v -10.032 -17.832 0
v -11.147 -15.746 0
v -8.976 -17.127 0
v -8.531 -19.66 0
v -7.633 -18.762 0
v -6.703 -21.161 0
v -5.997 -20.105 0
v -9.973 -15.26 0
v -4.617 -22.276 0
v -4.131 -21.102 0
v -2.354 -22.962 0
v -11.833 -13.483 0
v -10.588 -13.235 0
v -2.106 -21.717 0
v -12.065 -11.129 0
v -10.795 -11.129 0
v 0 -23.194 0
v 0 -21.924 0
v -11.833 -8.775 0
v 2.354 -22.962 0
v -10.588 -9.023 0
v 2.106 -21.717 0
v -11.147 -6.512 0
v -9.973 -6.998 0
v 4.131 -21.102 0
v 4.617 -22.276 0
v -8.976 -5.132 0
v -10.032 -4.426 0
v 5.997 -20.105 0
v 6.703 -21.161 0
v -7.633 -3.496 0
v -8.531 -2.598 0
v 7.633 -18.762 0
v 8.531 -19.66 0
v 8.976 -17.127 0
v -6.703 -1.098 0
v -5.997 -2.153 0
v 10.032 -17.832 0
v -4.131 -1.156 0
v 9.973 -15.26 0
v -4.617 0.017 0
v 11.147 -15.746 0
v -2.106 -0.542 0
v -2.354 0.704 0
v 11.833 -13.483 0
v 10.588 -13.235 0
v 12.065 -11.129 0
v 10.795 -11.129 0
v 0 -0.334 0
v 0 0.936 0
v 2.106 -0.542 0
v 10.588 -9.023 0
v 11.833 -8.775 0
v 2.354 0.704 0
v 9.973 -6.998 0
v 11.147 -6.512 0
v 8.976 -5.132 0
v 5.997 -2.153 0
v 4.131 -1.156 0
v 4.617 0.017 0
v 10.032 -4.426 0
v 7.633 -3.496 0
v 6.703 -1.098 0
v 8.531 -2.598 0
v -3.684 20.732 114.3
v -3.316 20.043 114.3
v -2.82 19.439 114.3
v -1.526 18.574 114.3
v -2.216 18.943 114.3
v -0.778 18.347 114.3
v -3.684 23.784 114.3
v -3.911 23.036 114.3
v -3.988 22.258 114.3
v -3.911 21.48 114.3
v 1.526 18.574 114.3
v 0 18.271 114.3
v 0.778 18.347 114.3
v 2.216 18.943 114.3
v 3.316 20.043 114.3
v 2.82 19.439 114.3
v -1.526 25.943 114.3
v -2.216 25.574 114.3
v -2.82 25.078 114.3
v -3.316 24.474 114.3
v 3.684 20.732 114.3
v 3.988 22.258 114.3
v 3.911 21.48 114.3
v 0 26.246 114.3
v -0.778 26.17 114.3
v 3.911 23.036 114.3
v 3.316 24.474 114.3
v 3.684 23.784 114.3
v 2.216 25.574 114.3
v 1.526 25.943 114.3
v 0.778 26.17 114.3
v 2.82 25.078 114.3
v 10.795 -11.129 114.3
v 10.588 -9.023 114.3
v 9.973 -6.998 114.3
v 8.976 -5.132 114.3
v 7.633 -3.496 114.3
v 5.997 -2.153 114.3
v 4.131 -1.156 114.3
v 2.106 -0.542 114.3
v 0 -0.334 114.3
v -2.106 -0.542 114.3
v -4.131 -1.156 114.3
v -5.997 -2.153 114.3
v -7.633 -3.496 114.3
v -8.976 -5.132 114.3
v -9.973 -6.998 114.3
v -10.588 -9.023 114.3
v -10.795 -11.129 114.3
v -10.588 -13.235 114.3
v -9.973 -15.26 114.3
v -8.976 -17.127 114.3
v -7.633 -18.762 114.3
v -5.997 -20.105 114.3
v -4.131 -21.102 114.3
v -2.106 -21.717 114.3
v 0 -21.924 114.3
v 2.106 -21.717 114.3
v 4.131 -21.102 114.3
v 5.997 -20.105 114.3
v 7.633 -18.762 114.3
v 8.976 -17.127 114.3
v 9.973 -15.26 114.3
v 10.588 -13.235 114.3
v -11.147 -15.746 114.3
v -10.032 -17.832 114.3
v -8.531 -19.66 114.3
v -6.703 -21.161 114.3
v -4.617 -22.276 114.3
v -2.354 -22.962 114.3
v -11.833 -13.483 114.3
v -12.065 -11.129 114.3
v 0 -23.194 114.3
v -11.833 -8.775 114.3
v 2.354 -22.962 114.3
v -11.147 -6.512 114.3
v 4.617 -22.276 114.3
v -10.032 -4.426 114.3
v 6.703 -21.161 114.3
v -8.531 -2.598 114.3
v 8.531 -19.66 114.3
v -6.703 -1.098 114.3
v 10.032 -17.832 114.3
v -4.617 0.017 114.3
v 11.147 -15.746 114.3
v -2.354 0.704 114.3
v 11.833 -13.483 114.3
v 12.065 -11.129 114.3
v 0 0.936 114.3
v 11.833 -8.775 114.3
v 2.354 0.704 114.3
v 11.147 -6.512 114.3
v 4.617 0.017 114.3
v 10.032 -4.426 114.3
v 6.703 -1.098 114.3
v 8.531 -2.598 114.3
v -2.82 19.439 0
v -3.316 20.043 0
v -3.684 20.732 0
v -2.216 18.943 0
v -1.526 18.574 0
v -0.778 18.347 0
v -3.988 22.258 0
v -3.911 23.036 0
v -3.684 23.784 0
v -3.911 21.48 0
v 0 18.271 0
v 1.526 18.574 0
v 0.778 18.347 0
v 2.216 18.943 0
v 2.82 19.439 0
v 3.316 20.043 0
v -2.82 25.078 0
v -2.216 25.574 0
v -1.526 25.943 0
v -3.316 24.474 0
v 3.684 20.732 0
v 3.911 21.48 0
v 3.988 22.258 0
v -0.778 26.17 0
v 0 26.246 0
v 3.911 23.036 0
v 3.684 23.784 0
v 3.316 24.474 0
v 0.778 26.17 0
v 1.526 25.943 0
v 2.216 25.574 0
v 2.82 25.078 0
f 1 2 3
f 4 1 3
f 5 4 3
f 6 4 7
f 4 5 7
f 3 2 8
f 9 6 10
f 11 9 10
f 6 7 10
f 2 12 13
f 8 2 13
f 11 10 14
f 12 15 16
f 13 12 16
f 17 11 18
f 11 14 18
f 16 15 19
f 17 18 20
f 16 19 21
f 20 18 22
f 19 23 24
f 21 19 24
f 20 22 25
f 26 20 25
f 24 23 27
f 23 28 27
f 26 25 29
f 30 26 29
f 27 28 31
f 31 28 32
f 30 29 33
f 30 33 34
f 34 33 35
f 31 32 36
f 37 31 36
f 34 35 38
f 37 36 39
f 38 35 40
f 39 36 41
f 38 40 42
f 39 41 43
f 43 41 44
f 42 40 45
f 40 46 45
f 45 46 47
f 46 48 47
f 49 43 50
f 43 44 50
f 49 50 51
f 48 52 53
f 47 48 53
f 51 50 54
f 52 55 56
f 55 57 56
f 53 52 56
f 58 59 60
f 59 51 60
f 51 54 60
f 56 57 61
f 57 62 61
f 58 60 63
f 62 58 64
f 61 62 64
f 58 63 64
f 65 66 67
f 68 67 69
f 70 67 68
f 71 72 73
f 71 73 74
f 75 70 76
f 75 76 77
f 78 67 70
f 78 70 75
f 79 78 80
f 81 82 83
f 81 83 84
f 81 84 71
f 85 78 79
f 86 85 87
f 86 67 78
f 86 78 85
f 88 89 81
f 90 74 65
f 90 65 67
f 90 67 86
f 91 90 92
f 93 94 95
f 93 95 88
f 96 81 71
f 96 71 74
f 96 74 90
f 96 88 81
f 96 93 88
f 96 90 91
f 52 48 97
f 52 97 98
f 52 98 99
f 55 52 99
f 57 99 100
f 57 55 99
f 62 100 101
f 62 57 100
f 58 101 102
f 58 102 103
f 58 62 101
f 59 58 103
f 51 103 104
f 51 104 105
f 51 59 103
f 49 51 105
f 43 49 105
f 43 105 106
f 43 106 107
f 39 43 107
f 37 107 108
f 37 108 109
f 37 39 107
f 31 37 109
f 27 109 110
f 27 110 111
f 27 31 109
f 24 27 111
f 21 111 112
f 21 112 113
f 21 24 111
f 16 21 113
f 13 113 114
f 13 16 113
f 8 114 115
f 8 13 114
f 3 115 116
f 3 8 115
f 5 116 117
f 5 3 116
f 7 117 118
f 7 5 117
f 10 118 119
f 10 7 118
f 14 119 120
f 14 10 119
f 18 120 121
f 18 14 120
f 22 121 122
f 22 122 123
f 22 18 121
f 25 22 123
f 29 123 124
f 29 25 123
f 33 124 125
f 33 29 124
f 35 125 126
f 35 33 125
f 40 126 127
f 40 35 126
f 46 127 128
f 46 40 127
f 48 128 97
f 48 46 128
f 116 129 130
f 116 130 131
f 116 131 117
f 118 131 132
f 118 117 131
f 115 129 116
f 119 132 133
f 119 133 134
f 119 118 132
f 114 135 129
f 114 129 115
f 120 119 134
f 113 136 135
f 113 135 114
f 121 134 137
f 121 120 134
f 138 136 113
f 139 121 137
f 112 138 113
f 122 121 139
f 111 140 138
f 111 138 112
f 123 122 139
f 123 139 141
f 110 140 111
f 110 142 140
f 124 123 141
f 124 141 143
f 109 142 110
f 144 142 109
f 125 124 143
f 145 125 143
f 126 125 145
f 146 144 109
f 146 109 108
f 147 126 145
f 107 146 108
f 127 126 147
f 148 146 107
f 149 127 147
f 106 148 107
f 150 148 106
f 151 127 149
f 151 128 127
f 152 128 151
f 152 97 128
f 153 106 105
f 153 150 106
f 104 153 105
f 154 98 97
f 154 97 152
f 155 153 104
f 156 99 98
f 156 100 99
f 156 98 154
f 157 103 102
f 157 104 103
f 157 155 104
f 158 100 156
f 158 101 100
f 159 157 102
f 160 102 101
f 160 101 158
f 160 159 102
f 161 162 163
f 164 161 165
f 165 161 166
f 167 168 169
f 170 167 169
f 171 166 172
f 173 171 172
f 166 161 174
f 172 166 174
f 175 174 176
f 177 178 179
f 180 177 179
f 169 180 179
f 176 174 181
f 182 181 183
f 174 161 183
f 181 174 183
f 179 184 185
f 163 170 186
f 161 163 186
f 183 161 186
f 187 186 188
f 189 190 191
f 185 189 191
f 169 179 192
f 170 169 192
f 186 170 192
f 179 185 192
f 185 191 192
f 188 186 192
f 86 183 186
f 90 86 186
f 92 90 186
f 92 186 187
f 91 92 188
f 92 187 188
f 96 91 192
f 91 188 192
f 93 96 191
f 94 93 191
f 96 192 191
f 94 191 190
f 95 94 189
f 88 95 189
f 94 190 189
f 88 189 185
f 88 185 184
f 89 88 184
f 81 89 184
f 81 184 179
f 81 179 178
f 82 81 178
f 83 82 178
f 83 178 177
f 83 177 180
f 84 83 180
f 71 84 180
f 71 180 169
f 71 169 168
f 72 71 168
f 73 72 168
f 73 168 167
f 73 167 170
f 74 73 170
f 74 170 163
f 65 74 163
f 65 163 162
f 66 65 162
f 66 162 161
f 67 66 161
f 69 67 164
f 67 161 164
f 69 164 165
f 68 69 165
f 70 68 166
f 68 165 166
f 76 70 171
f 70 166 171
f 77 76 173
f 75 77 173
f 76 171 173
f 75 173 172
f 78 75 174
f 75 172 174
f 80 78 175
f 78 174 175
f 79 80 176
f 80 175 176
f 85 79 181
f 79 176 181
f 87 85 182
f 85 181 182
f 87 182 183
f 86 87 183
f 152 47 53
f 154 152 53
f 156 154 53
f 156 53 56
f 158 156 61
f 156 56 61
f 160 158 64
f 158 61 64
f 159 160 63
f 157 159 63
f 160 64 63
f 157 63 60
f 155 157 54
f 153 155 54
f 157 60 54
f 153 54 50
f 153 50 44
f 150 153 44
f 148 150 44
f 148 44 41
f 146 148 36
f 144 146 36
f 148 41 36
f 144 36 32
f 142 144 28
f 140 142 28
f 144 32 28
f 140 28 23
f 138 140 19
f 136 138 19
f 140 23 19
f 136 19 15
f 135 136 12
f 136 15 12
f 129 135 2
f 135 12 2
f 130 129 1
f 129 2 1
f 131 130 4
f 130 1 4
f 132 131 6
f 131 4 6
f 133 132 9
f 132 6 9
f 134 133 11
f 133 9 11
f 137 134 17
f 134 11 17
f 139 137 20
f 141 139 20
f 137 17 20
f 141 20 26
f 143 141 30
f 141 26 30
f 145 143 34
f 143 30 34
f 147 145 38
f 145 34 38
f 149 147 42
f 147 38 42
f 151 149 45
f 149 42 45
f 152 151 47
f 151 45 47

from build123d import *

# Parameters (mm, degrees)
F0_R      = 3.9878
F1_DEPTH  = 107.95
F0_R_2    = 12.065
F0_R_3    = 10.795
F1_FACE_R = 3.9878
F2_DEPTH  = 114.3


with BuildPart() as f1:
    # F0 (on Top) → F1 (new body)
    with BuildSketch(Plane.XY):
        with Locations((0, 22.2584257233)):
            Circle(F0_R)
    extrude(amount=F1_DEPTH)

    # F0 (on Top) + F1_face (on face) → F2 (join)
    with BuildSketch(Plane.XY):
        with Locations((0, -11.1292128617)):
            Circle(F0_R_2)
        with Locations((0, -11.1292128617)):
            Circle(F0_R_3, mode=Mode.SUBTRACT)
        with Locations((0, 22.2584257233)):
            Circle(F0_R)
    with BuildSketch(Plane(origin=(0, 22.2584257233, 0), x_dir=(1, 0, 0), z_dir=(0, 0, -1))):
        Circle(F1_FACE_R)
    extrude(amount=F2_DEPTH, dir=(0, 0, 1))


solid = f1.part
